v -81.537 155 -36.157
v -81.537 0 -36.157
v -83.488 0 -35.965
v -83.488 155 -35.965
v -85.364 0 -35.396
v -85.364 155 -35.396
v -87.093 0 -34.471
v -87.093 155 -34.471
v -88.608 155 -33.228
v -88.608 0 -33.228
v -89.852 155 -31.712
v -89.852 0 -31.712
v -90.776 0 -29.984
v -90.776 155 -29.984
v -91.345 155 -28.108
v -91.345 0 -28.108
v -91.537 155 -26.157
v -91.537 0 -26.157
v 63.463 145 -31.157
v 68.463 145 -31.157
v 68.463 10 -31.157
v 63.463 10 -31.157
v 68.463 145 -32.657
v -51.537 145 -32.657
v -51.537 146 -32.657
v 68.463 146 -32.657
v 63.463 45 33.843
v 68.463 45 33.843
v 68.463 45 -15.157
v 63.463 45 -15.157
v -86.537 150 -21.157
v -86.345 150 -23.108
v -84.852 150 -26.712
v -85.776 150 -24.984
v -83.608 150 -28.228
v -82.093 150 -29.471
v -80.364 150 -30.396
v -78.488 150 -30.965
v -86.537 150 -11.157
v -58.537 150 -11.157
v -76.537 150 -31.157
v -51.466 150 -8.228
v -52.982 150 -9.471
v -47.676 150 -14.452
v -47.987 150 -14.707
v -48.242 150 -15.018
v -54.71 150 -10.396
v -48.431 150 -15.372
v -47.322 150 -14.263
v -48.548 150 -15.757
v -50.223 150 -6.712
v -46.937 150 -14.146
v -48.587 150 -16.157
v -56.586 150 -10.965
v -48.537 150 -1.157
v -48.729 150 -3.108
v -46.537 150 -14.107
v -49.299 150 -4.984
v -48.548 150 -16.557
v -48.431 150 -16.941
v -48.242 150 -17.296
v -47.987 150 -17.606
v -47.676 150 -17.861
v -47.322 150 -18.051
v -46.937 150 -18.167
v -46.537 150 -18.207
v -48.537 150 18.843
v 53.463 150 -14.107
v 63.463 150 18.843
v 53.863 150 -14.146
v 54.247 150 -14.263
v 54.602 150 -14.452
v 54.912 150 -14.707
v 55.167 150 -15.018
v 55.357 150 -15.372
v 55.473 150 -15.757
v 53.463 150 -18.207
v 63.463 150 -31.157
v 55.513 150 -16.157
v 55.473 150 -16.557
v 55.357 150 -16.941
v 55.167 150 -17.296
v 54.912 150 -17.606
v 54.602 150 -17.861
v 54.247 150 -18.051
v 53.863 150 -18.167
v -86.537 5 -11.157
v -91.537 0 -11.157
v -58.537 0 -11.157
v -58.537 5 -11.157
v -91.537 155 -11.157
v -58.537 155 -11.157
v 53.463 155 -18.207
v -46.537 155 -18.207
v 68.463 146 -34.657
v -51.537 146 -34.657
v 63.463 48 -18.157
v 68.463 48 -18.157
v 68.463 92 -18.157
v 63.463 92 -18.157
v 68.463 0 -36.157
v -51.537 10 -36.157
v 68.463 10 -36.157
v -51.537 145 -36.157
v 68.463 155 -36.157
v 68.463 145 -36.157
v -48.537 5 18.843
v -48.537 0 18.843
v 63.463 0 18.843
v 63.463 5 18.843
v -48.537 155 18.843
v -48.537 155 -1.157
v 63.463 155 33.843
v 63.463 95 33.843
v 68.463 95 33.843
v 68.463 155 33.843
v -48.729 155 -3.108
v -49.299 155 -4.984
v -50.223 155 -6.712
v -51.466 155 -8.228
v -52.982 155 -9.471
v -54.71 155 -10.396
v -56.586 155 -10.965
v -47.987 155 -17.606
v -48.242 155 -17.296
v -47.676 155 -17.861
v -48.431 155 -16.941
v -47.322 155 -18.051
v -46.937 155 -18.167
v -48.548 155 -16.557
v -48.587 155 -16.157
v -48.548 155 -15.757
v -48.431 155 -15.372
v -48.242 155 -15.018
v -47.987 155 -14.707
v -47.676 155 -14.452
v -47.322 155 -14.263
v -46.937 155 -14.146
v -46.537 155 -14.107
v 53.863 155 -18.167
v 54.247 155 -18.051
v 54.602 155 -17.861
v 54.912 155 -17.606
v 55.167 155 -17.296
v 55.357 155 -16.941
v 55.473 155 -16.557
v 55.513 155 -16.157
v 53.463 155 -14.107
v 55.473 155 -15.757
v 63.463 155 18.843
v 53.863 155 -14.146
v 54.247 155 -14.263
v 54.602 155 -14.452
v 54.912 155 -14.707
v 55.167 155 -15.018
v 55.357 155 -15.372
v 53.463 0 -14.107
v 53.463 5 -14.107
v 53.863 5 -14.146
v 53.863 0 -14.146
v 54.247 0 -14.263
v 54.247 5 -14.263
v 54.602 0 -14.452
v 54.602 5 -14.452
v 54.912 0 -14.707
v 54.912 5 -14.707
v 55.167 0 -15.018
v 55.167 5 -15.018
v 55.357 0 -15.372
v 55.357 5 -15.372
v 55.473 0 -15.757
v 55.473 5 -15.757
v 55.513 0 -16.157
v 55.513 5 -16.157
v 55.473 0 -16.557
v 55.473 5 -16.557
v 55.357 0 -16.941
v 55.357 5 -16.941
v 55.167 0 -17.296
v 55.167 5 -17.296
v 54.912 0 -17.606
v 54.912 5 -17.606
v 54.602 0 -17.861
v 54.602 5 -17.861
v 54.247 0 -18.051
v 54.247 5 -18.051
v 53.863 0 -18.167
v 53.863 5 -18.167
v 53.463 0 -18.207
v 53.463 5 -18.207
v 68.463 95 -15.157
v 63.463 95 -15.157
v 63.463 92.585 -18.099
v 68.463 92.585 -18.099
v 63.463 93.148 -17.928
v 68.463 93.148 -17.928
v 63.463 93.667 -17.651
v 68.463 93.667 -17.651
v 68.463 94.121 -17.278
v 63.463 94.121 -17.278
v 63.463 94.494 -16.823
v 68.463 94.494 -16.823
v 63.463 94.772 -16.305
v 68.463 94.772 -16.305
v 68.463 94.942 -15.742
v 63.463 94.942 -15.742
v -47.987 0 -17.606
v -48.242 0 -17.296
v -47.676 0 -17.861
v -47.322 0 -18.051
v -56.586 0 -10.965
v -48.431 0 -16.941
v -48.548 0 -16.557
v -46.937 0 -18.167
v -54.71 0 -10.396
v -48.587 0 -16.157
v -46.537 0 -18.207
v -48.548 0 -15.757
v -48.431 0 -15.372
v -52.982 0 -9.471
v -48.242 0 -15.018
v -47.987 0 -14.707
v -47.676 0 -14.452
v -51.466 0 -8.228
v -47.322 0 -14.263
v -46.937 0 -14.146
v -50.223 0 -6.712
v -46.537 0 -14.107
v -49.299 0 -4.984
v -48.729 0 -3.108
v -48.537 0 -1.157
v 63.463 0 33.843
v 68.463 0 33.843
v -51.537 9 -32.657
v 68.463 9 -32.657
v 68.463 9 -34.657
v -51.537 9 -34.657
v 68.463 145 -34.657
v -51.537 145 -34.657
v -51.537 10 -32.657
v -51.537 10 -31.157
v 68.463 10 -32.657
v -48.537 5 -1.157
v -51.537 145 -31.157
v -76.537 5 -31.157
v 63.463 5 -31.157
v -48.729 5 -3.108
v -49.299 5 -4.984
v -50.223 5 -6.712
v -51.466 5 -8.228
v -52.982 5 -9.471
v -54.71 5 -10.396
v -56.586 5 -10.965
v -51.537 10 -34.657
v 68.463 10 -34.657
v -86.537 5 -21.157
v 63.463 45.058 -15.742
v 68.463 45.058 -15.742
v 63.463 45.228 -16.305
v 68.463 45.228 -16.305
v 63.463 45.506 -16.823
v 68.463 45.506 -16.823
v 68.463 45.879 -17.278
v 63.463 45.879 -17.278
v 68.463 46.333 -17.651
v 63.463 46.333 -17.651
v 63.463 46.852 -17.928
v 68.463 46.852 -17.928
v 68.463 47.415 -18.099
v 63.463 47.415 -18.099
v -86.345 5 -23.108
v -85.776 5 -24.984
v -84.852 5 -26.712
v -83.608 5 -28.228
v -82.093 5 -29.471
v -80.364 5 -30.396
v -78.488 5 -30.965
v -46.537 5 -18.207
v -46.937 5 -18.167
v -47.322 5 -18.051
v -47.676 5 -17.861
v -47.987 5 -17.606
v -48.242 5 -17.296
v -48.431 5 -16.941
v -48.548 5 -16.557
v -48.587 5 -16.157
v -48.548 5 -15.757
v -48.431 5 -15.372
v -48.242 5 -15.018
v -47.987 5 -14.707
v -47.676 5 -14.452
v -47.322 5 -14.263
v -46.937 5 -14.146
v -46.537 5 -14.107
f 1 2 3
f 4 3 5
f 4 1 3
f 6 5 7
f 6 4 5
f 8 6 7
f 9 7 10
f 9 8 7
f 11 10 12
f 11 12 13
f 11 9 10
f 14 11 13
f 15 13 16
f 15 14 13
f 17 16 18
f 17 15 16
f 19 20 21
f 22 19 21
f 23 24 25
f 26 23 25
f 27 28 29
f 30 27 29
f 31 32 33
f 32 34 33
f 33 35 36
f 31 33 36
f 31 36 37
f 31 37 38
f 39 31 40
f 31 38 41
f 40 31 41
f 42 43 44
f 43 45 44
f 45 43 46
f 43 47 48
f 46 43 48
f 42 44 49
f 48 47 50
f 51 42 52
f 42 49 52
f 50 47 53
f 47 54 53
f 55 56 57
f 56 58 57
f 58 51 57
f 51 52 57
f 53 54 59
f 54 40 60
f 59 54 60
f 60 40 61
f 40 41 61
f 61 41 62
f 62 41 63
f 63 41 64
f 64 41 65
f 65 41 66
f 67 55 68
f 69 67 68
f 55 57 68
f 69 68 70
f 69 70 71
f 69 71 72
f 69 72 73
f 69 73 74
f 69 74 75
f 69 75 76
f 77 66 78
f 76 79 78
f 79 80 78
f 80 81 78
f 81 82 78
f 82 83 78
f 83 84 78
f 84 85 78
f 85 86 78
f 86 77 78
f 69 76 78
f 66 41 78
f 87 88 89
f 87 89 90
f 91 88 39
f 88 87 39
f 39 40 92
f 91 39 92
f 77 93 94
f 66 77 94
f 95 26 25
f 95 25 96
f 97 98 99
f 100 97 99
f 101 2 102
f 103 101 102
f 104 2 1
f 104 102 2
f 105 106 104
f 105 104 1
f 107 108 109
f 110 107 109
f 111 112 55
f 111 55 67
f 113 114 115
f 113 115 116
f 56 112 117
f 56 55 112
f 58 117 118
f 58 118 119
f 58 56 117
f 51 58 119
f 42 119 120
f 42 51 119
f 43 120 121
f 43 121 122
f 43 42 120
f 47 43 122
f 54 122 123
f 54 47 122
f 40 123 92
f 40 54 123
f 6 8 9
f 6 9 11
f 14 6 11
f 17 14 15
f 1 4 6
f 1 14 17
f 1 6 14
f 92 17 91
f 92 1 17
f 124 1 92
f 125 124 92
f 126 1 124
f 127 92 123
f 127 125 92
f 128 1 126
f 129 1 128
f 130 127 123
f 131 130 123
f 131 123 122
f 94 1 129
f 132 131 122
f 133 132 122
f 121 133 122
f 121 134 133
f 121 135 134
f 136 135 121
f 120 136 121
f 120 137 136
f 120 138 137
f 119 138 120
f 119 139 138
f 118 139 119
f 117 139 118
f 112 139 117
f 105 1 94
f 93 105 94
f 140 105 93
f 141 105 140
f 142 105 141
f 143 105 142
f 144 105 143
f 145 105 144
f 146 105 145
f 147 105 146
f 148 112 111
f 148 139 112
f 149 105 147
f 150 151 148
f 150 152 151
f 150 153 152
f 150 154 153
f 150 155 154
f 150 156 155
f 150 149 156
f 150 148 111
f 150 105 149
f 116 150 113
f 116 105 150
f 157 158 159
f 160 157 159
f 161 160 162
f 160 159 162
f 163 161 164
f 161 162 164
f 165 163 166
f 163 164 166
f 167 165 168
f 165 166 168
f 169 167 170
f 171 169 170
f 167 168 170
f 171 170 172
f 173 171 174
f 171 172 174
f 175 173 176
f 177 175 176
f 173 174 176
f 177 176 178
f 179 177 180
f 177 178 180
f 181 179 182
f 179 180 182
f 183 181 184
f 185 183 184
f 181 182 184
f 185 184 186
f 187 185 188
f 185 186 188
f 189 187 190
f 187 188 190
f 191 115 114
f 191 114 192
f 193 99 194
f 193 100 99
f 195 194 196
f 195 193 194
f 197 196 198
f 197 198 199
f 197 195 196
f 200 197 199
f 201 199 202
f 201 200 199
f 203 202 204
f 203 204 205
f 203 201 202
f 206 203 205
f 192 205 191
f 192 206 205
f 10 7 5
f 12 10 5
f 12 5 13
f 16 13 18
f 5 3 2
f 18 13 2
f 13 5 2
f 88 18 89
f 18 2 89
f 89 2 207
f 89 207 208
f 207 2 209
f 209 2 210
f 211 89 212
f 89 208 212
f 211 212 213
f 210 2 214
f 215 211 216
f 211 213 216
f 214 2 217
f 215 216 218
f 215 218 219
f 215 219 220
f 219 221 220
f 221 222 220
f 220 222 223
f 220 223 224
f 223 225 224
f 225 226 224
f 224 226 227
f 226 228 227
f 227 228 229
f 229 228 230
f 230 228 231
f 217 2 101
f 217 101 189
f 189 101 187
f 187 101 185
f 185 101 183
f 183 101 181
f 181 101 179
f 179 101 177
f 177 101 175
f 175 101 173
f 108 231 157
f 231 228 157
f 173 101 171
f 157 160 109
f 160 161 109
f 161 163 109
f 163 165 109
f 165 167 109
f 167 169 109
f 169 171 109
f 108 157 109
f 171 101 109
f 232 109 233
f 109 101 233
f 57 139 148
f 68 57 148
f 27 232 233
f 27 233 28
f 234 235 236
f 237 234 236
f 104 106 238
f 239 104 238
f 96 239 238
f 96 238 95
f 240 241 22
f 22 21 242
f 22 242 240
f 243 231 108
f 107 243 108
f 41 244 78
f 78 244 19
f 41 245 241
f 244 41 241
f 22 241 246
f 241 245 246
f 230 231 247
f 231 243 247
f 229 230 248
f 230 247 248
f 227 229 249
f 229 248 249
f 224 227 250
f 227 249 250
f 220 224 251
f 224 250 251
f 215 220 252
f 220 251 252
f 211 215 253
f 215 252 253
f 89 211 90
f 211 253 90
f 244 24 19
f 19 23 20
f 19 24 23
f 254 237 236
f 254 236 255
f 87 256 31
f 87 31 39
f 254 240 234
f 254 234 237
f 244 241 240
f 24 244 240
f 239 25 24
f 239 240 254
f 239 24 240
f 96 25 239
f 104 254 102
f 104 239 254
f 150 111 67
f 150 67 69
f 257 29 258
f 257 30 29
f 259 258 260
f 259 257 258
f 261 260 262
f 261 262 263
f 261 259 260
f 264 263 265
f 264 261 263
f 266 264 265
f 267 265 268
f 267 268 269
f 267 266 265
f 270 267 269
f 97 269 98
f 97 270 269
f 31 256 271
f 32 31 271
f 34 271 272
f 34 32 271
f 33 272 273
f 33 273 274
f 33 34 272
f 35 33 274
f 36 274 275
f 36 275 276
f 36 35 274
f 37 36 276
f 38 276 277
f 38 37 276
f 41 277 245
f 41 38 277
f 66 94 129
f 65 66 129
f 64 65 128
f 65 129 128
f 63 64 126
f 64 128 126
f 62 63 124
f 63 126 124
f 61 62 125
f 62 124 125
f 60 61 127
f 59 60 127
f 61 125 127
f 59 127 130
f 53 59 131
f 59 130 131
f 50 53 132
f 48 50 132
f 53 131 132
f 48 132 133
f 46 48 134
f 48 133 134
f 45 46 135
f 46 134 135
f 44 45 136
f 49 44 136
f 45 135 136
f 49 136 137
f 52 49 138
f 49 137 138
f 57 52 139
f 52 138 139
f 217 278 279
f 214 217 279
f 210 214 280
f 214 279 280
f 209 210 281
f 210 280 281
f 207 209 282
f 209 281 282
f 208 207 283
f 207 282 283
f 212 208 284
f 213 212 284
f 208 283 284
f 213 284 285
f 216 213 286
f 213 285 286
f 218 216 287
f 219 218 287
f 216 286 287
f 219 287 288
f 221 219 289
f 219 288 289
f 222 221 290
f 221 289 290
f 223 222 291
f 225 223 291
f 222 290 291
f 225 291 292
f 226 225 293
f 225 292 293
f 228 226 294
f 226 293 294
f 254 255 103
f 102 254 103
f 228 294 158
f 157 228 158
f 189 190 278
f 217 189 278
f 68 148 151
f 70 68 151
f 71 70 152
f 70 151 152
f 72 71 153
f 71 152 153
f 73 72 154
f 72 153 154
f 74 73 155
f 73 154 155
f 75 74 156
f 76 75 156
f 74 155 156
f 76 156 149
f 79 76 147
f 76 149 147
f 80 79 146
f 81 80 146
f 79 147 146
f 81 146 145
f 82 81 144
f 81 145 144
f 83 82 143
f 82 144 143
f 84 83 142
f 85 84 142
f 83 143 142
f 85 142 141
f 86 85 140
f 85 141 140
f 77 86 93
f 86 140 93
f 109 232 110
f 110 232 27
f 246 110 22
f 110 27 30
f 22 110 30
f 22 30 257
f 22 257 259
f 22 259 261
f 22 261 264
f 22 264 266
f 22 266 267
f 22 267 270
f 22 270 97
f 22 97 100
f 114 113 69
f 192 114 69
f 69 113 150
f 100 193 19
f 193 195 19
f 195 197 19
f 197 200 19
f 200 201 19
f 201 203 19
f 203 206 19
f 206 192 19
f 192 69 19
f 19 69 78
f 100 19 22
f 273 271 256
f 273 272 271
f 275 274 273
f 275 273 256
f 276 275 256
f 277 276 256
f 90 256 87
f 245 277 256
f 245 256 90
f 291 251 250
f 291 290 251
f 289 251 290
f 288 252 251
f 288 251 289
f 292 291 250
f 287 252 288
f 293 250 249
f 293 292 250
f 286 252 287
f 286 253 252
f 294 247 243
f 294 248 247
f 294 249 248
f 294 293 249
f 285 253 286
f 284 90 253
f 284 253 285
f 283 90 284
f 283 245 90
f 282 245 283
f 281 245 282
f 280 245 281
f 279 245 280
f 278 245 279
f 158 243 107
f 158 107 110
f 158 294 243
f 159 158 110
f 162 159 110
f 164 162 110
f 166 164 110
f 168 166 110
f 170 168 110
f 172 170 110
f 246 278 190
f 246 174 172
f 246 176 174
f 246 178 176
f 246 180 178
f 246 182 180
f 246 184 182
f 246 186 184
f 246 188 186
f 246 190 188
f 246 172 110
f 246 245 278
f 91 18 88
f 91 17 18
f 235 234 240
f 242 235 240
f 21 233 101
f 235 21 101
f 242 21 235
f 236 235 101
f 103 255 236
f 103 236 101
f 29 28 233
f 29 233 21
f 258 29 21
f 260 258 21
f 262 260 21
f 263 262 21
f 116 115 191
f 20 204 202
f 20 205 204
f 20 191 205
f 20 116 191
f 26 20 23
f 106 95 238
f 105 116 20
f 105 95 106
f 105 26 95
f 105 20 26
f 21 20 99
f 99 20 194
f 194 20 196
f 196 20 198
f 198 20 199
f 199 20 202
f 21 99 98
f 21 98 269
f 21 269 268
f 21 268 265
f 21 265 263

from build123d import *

# Parameters (mm, degrees)
BOSS_EXTRUDE1_DEPTH = 5
SKETCH2_W           = 150
SKETCH2_H           = 5
BOSS_EXTRUDE2_DEPTH = 145
SKETCH6_W           = 70
SKETCH6_H           = 155
BOSS_EXTRUDE3_DEPTH = 5
SKETCH7_W           = 52
SKETCH7_H           = 50
CUT_EXTRUDE1_DEPTH  = 5
SKETCH8_W           = 25
SKETCH8_H           = 155
BOSS_EXTRUDE4_DEPTH = 5
FILLET1_R           = 10
FILLET2_R           = 10
SKETCH9_W           = 2
SKETCH9_H           = 1
CUT_EXTRUDE2_DEPTH  = 120
FILLET5_R           = 3
CUT_EXTRUDE4_START  = -155
CUT_EXTRUDE4_DEPTH  = 155


with BuildPart() as part:
    # Sketch1 → Boss-Extrude1 (new body)
    with BuildSketch(Plane(origin=(0, 0, 0), x_dir=(1, 0, 0), z_dir=(0, 1, 0))):
        Polygon((63.462686567, 36.156716418), (-86.537313433, 36.156716418), (-86.537313433, 11.156716418), (-48.537313433, 11.156716418), (-48.537313433, -18.843283582), (63.462686567, -18.843283582), align=None)
    boss_extrude1 = extrude(amount=BOSS_EXTRUDE1_DEPTH)

    # Sketch2 → Boss-Extrude2 (add)
    with BuildSketch(Plane(origin=(0, 5, 0), x_dir=(1, 0, 0), z_dir=(0, 1, 0))):
        with Locations((-11.537313433, 33.656716418)):
            Rectangle(SKETCH2_W, SKETCH2_H)
    extrude(amount=BOSS_EXTRUDE2_DEPTH)

    # Mirror1: Boss-Extrude1 across plane
    add(boss_extrude1.mirror(Plane.ZX.offset(77.5)))

    # Sketch6 → Boss-Extrude3 (add)
    with BuildSketch(Plane(origin=(63.462686567, 0, 0), x_dir=(0, 0, -1), z_dir=(1, 0, 0))):
        with Locations((1.156716418, 77.5)):
            Rectangle(SKETCH6_W, SKETCH6_H)
    extrude(amount=BOSS_EXTRUDE3_DEPTH)

    # Sketch7 → Cut-Extrude1 (cut)
    with BuildSketch(Plane(origin=(68.462686567, 0, 0), x_dir=(0, 0, -1), z_dir=(1, 0, 0))):
        with Locations((-7.843283582, 70)):
            Rectangle(SKETCH7_W, SKETCH7_H)
    extrude(amount=-CUT_EXTRUDE1_DEPTH, mode=Mode.SUBTRACT)

    # Sketch8 → Boss-Extrude4 (add)
    with BuildSketch(Plane.ZY.offset(86.537313433)):
        with Locations((-23.656716418, 77.5)):
            Rectangle(SKETCH8_W, SKETCH8_H)
    extrude(amount=BOSS_EXTRUDE4_DEPTH)

    # Fillet1
    fillet1_edges = [part.edges().sort_by_distance(p)[0] for p in [
        (-48.537313433, 2.5, -11.156716418),
        (-48.537313433, 152.5, -11.156716418),
        (-91.537313433, 77.5, -36.156716418),
    ]]
    fillet(fillet1_edges, radius=FILLET1_R)

    # Fillet2
    fillet2_edges = [part.edges().sort_by_distance(p)[0] for p in [
        (-86.537313433, 77.5, -31.156716418),
    ]]
    fillet(fillet2_edges, radius=FILLET2_R)

    # Sketch9 → Cut-Extrude2 (cut)
    with BuildSketch(Plane(origin=(68.462686567, 0, 0), x_dir=(0, 0, -1), z_dir=(1, 0, 0))):
        Polygon((36.156716418, 10), (36.156716418, 145), (34.656716418, 145), (32.656716418, 145), (31.156716418, 145), (31.156716418, 10), (32.656716418, 10), (34.656716418, 10), align=None)
        with Locations((33.656716418, 9.5)):
            Rectangle(SKETCH9_W, SKETCH9_H)
        with Locations((33.656716418, 145.5)):
            Rectangle(SKETCH9_W, SKETCH9_H)
    extrude(amount=-CUT_EXTRUDE2_DEPTH, mode=Mode.SUBTRACT)

    # Fillet5
    fillet5_edges = [part.edges().sort_by_distance(p)[0] for p in [
        (65.962686567, 95, -18.156716418),
        (65.962686567, 45, -18.156716418),
    ]]
    fillet(fillet5_edges, radius=FILLET5_R)

    # Sketch11 → Cut-Extrude4 (cut)
    with BuildSketch(Plane.XZ.offset(CUT_EXTRUDE4_START)):
        with BuildLine():
            Line((53.462686567, -18.206716418), (-46.537313433, -18.206716418))
            ThreePointArc((-46.537313433, -18.206716418), (-48.587313433, -16.156716418), (-46.537313433, -14.106716418))
            Line((-46.537313433, -14.106716418), (53.462686567, -14.106716418))
            ThreePointArc((53.462686567, -14.106716418), (55.512686567, -16.156716418), (53.462686567, -18.206716418))
        make_face()
    extrude(amount=CUT_EXTRUDE4_DEPTH, mode=Mode.SUBTRACT)


solid = part.part
